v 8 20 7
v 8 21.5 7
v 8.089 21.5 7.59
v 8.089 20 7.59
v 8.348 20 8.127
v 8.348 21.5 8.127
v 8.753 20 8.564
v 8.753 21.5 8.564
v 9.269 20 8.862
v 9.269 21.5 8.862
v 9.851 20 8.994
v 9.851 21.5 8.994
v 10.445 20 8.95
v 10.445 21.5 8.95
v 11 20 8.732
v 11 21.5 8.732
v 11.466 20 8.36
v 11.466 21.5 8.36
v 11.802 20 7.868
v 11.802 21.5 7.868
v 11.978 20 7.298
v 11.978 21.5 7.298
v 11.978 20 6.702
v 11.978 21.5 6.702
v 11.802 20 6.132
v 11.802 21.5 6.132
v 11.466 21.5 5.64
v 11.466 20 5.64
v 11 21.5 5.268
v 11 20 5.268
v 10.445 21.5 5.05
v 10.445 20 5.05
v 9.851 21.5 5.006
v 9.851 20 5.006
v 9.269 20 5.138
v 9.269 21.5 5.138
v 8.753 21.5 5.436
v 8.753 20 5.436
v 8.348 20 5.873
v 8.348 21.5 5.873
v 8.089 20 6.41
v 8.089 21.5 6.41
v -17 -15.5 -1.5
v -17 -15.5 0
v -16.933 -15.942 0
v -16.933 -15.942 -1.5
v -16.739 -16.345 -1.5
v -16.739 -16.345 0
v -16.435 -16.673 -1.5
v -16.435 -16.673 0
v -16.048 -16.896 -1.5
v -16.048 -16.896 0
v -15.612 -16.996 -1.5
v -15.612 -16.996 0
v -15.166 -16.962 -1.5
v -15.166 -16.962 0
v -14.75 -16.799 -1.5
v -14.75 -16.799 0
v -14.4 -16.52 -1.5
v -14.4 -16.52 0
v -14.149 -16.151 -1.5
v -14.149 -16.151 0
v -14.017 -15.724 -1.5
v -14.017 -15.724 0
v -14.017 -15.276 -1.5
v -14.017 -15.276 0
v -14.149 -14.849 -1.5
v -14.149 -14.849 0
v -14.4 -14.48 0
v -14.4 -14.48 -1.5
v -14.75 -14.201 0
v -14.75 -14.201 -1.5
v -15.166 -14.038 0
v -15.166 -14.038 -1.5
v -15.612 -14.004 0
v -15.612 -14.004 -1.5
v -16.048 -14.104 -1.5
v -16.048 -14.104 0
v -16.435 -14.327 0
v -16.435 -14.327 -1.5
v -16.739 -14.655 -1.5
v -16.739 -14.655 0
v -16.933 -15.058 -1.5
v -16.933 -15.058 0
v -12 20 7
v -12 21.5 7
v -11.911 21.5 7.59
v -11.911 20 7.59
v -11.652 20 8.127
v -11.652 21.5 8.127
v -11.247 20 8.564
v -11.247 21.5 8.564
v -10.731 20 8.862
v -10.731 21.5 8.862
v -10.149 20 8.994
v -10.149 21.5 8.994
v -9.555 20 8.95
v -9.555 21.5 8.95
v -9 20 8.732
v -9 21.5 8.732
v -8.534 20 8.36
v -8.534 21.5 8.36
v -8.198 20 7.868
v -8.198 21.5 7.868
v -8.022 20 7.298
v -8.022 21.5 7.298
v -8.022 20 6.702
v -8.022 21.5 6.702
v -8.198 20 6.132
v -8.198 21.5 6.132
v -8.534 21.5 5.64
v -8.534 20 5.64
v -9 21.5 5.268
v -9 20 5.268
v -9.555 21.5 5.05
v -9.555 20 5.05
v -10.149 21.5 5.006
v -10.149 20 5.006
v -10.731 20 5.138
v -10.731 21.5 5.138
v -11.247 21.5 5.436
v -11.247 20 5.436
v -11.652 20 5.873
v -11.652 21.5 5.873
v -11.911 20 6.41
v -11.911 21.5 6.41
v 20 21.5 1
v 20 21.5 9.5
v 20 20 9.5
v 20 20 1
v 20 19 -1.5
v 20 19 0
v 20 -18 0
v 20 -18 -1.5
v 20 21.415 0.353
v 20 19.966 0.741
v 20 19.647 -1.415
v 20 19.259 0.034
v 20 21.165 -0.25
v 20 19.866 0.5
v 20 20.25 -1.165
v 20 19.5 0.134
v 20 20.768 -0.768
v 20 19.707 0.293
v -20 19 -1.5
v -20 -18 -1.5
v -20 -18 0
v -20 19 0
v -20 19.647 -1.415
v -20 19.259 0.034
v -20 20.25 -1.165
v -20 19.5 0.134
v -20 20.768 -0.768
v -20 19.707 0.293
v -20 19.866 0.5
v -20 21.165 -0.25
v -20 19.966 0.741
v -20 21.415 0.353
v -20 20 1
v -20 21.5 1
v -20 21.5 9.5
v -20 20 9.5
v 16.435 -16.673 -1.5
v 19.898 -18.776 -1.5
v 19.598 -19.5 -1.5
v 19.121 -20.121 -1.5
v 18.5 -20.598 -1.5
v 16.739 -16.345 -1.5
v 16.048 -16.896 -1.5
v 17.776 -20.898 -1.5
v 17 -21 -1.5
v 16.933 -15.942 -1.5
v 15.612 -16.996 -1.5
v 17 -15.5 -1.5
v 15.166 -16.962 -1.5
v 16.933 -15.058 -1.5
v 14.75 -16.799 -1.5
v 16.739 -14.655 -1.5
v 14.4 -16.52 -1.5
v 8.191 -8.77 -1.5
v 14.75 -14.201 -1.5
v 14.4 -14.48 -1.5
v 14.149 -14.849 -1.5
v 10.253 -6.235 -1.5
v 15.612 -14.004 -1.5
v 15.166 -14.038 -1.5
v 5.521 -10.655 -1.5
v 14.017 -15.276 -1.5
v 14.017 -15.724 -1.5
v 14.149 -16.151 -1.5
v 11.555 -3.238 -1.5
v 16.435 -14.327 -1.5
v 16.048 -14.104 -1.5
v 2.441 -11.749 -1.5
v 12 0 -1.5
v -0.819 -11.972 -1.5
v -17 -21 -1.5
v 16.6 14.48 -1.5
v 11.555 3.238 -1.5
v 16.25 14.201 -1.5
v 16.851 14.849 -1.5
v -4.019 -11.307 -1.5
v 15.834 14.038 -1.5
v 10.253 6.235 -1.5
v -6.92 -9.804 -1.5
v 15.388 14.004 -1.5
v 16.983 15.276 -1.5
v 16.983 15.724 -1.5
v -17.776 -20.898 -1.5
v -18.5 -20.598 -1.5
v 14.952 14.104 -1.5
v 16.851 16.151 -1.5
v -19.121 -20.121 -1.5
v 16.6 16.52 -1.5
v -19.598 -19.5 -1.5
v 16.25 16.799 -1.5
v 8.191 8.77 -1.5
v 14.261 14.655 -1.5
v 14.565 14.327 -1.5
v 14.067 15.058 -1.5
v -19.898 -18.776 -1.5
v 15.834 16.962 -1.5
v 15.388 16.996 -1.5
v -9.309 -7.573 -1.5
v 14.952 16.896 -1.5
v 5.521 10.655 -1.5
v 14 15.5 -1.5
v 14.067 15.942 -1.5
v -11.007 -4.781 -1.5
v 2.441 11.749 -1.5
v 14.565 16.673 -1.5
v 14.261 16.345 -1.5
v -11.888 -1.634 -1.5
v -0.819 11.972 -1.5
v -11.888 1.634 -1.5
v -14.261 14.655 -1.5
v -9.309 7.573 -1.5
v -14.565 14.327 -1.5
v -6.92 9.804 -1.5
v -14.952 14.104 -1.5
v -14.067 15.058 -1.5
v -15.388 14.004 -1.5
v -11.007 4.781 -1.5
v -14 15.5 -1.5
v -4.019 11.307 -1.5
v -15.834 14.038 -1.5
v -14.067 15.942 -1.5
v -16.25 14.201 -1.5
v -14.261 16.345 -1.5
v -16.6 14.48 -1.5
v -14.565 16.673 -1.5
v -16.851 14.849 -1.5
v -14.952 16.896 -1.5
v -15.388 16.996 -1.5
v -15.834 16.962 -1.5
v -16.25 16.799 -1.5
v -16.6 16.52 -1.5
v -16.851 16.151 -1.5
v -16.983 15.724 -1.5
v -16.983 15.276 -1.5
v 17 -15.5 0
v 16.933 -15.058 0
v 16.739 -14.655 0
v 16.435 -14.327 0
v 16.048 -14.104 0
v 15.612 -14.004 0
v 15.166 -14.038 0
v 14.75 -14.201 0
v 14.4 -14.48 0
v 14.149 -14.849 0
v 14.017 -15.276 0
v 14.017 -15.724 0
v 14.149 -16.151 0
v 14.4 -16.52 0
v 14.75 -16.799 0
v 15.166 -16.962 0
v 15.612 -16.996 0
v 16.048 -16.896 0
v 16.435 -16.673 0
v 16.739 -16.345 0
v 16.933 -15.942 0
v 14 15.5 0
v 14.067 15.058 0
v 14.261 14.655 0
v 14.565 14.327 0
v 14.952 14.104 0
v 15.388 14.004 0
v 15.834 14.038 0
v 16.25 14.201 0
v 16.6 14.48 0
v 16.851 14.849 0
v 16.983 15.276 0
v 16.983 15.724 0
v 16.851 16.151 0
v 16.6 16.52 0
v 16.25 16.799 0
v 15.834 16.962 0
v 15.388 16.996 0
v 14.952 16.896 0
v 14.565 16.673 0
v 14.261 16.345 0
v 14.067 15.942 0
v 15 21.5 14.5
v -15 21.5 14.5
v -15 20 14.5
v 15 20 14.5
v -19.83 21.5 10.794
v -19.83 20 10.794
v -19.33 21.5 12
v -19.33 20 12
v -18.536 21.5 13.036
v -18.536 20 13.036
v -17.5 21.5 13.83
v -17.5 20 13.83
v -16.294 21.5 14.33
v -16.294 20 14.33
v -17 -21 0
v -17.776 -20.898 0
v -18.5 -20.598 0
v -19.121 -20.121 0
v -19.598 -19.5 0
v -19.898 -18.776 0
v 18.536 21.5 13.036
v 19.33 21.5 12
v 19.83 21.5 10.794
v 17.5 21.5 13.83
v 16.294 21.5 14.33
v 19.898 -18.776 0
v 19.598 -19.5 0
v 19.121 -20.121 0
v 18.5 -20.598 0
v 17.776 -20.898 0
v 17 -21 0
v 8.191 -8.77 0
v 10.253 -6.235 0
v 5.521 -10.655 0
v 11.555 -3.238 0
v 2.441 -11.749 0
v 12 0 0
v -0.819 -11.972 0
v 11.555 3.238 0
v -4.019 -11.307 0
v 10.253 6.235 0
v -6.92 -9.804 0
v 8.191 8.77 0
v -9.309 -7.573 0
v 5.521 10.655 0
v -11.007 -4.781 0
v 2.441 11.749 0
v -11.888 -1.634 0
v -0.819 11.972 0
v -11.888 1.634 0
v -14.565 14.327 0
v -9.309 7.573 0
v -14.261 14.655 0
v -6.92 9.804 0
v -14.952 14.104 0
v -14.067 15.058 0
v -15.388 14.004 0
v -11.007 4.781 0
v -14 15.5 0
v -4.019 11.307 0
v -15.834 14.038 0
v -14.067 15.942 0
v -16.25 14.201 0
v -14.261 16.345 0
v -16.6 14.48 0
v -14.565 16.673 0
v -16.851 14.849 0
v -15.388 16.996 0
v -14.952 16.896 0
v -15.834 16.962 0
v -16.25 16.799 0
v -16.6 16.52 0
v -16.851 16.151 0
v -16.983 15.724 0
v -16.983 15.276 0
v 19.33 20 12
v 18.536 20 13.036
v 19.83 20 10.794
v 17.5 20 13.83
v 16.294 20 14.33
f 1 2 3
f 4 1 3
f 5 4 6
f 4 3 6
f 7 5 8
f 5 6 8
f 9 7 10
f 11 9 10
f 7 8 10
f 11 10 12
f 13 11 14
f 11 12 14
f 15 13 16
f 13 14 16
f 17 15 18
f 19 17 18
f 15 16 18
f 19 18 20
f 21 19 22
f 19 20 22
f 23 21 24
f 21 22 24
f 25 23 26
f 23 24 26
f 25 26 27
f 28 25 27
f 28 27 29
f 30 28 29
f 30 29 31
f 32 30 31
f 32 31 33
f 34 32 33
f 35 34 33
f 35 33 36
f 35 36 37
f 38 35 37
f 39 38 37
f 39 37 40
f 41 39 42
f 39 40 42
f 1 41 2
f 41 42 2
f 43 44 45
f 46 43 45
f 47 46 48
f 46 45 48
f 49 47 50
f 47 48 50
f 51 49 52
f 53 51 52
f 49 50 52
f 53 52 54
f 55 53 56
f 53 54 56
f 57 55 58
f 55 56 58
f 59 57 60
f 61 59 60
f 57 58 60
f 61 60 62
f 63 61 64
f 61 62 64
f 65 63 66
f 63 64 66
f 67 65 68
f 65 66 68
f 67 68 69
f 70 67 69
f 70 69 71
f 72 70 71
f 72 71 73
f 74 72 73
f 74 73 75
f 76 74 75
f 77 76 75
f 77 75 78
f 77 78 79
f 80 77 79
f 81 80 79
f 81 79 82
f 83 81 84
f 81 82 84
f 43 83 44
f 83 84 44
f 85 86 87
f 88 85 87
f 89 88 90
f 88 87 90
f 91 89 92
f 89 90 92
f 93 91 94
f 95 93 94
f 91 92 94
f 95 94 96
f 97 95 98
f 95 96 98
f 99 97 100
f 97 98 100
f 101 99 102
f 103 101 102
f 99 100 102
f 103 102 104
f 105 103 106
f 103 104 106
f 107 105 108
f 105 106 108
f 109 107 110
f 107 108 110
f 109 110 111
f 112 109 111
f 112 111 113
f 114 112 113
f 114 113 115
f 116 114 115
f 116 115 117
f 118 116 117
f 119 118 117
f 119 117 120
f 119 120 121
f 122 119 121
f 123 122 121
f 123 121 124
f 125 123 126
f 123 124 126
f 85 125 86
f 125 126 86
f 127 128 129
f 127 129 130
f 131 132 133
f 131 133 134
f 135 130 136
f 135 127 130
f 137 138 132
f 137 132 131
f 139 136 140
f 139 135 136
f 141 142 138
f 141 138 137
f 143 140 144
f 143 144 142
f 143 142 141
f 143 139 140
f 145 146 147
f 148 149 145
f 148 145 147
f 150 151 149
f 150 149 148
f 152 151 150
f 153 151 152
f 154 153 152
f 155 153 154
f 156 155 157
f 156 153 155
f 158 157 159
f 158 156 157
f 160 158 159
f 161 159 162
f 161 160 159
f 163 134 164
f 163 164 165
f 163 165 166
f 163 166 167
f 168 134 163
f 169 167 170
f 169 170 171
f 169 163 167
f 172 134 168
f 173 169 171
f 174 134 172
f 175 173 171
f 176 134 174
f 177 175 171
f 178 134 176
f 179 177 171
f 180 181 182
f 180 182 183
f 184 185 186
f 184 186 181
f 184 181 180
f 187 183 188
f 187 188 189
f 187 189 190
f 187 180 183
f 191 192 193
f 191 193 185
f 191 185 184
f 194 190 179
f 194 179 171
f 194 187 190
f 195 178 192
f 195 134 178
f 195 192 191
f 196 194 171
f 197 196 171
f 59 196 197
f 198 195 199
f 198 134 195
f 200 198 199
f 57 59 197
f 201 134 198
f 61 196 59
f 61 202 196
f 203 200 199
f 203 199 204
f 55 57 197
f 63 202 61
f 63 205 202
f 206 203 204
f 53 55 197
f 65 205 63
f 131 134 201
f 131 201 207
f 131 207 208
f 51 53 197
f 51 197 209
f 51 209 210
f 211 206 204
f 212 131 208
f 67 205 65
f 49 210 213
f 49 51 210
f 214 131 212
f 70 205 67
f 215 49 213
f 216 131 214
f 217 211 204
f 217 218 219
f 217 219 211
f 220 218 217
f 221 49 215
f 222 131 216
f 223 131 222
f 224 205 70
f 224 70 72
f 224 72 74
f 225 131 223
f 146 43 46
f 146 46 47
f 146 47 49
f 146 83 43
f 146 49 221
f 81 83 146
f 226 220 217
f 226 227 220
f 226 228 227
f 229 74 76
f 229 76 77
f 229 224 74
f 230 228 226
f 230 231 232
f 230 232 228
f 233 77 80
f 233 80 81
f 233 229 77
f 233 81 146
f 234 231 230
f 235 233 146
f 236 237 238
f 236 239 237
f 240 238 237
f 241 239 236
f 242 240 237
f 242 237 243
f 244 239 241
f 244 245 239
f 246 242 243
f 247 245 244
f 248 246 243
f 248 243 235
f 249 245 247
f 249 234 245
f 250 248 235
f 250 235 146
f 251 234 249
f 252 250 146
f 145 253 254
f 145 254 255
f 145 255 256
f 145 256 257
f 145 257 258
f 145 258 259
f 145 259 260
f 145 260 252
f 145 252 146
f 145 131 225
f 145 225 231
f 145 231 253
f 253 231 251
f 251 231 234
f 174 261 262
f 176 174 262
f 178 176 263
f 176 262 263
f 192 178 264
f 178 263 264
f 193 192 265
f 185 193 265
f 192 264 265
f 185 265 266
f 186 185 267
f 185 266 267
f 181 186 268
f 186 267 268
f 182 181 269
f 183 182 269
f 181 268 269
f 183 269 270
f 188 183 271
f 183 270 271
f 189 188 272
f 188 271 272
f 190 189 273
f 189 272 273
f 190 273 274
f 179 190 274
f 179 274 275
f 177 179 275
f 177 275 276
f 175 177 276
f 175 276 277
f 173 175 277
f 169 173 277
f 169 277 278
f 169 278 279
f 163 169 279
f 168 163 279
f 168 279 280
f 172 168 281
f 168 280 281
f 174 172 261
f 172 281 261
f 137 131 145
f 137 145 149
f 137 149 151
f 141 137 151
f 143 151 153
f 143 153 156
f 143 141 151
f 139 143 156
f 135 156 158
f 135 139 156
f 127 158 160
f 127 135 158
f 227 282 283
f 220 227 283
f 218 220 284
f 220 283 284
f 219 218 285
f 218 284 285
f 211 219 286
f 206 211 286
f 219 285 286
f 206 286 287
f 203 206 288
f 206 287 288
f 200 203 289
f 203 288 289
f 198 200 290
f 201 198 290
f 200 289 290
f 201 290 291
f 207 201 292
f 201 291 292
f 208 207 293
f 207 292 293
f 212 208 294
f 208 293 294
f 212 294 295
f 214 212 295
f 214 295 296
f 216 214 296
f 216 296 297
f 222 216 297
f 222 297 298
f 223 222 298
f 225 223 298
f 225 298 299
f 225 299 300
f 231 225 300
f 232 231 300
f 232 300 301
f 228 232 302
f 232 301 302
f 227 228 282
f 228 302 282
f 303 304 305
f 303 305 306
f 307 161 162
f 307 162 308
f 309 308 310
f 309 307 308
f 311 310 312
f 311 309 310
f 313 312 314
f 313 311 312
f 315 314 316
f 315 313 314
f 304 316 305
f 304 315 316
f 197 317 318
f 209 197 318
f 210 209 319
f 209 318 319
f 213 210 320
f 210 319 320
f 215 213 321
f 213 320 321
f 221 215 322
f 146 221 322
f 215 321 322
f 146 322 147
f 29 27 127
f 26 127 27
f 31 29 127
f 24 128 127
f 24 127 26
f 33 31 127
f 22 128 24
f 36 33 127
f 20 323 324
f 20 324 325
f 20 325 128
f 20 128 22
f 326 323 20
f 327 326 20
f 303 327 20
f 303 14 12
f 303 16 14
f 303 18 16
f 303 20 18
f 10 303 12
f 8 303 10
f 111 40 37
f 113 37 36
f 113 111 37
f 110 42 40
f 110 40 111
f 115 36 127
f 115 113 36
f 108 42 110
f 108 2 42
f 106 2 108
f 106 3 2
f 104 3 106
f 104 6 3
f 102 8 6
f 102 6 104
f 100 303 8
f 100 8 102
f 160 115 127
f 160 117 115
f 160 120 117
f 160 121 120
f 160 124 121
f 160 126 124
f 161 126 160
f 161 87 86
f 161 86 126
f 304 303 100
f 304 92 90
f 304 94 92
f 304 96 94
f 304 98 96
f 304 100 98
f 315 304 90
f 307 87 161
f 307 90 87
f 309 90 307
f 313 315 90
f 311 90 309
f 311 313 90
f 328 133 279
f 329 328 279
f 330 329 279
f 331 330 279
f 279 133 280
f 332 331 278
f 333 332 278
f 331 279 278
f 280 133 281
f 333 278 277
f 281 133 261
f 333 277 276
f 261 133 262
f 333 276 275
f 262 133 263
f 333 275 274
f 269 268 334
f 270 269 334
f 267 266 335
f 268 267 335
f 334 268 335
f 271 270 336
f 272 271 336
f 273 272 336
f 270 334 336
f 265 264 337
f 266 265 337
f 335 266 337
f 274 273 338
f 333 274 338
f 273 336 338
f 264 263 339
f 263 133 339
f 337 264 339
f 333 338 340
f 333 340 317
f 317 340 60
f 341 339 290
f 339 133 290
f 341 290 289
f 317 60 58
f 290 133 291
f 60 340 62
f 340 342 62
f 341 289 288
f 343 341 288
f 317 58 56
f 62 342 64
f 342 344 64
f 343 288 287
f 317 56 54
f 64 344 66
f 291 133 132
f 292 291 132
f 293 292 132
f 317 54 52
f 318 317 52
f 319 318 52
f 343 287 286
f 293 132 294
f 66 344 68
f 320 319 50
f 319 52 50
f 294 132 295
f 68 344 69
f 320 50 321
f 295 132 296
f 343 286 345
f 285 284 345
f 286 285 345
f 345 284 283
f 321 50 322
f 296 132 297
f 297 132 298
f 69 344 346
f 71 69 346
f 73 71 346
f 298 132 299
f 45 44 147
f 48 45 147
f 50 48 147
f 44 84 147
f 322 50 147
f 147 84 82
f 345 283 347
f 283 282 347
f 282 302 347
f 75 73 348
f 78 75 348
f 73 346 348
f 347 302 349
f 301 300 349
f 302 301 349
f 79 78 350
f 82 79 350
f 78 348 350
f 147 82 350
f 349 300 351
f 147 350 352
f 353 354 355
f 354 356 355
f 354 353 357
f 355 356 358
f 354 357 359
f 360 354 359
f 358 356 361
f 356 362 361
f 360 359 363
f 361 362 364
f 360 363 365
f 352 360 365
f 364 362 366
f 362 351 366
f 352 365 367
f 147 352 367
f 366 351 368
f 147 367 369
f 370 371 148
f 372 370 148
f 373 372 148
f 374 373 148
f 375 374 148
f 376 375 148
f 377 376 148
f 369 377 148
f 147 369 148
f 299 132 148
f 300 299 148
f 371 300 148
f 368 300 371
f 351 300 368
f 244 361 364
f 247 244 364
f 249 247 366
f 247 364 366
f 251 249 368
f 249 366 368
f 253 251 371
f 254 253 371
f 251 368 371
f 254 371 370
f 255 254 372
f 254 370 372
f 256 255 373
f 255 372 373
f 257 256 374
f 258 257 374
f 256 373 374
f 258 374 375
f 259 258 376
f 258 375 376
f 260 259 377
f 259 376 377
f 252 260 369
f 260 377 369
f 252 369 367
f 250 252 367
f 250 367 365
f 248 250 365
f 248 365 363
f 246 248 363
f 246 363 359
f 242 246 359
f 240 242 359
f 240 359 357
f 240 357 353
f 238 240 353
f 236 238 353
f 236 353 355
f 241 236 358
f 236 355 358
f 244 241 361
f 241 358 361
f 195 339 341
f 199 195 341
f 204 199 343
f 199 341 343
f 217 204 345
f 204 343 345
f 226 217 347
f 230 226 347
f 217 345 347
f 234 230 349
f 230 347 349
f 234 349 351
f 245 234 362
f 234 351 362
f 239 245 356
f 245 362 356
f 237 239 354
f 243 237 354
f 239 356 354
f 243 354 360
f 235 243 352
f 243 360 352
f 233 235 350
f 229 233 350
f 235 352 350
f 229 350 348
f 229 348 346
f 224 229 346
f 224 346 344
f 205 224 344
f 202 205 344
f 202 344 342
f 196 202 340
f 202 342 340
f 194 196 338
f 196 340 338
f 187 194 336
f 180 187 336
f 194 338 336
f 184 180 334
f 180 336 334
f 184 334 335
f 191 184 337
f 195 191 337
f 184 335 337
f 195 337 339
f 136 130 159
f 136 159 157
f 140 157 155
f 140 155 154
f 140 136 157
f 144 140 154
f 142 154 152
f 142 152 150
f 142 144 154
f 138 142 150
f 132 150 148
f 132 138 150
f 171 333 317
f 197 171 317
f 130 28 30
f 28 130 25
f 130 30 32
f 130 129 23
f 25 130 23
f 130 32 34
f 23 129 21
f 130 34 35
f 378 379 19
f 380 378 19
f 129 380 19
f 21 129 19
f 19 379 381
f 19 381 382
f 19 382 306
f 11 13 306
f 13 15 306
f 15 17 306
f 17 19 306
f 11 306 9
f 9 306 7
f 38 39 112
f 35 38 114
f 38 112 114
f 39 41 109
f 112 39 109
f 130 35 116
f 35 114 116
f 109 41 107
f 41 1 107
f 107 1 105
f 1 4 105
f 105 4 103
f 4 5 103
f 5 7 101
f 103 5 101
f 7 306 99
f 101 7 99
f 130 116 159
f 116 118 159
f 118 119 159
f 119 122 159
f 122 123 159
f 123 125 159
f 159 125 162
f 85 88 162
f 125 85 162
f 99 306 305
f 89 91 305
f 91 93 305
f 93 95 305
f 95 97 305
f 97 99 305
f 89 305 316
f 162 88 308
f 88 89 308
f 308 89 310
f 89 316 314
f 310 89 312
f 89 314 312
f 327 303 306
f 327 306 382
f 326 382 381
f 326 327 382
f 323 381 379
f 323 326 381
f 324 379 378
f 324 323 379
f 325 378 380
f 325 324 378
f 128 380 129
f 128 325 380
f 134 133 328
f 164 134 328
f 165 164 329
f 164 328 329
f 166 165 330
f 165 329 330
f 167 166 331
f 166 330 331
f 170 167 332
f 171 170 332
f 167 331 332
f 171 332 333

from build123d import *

# Parameters (mm, degrees)
SKETCH_1_R                       = 1.5
SKETCH_1_R_2                     = 12
SM_BASE_FLANGE_1_DEPTH           = 1.5
SM_EDGE_FLANGE_1_STRIP_W         = 8
SM_EDGE_FLANGE_1_STRIP_H         = 1.5
SM_EDGE_FLANGE_1_STRIP_CUT_DEPTH = 40
SM_EDGE_FLANGE_1_DEPTH           = 40
SM_EDGE_FLANGE_1_PROFILE_R       = 2
SM_EDGE_FLANGE_1_FLAT_DEPTH      = 1.5


# Sheet-metal steps are written as plain solids
with BuildPart() as part:
    # Sketch 1 → 基体-法兰1 (new body)
    with BuildSketch(Plane.XY):
        with BuildLine():
            Line((-20, 21.5), (20, 21.5))
            Line((20, 21.5), (20, -18))
            ThreePointArc((20, -18), (19.121320344, -20.121320344), (17, -21))
            Line((17, -21), (-17, -21))
            ThreePointArc((-17, -21), (-19.121320344, -20.121320344), (-20, -18))
            Line((-20, -18), (-20, 21.5))
        make_face()
        with Locations((-15.5, 15.5)):
            Circle(SKETCH_1_R, mode=Mode.SUBTRACT)
        with Locations(Location((15.5, 15.5, 0), (0, 0, 180))):
            Circle(SKETCH_1_R, mode=Mode.SUBTRACT)
        with Locations((15.5, -15.5)):
            Circle(SKETCH_1_R, mode=Mode.SUBTRACT)
        with Locations(Location((-15.5, -15.5, 0), (0, 0, 180))):
            Circle(SKETCH_1_R, mode=Mode.SUBTRACT)
        Circle(SKETCH_1_R_2, mode=Mode.SUBTRACT)
    extrude(amount=-SM_BASE_FLANGE_1_DEPTH)

    # 边线-法兰1 strip (across the edge) → 边线-法兰1 strip cut (cut)
    with BuildSketch(Plane(origin=(20, 21.5, 0), x_dir=(0, -1, 0), z_dir=(-1, 0, 0))):
        with Locations((-1.5, -0.75)):
            Rectangle(SM_EDGE_FLANGE_1_STRIP_W, SM_EDGE_FLANGE_1_STRIP_H)
    extrude(amount=SM_EDGE_FLANGE_1_STRIP_CUT_DEPTH, mode=Mode.SUBTRACT)

    # 边线-法兰1 bend section (across the edge) → 边线-法兰1 (add)
    with BuildSketch(Plane(origin=(20, 21.5, 0), x_dir=(0, -1, 0), z_dir=(-1, 0, 0))):
        with BuildLine():
            Line((0, 1), (1.5, 1))
            ThreePointArc((1.5, 1), (1.792893219, 0.292893219), (2.5, 0))
            Line((2.5, 0), (2.5, -1.5))
            ThreePointArc((2.5, -1.5), (0.732233047, -0.767766953), (0, 1))
        make_face()
    extrude(amount=SM_EDGE_FLANGE_1_DEPTH)

    # 边线-法兰1 profile (on flange) → 边线-法兰1 flat (add)
    with BuildSketch(Plane(origin=(0, 21.5, 0), x_dir=(-1, 0, 0), z_dir=(0, 1, 0))):
        with BuildLine():
            Line((15, 14.5), (-15, 14.5))
            ThreePointArc((-15, 14.5), (-18.535533906, 13.035533906), (-20, 9.5))
            Line((-20, 9.5), (-20, 1))
            Line((-20, 1), (20, 1))
            Line((20, 1), (20, 9.5))
            ThreePointArc((20, 9.5), (18.535533906, 13.035533906), (15, 14.5))
        make_face()
        with Locations((-10, 7)):
            Circle(SM_EDGE_FLANGE_1_PROFILE_R, mode=Mode.SUBTRACT)
        with Locations((10, 7)):
            Circle(SM_EDGE_FLANGE_1_PROFILE_R, mode=Mode.SUBTRACT)
    extrude(amount=-SM_EDGE_FLANGE_1_FLAT_DEPTH)


solid = part.part
